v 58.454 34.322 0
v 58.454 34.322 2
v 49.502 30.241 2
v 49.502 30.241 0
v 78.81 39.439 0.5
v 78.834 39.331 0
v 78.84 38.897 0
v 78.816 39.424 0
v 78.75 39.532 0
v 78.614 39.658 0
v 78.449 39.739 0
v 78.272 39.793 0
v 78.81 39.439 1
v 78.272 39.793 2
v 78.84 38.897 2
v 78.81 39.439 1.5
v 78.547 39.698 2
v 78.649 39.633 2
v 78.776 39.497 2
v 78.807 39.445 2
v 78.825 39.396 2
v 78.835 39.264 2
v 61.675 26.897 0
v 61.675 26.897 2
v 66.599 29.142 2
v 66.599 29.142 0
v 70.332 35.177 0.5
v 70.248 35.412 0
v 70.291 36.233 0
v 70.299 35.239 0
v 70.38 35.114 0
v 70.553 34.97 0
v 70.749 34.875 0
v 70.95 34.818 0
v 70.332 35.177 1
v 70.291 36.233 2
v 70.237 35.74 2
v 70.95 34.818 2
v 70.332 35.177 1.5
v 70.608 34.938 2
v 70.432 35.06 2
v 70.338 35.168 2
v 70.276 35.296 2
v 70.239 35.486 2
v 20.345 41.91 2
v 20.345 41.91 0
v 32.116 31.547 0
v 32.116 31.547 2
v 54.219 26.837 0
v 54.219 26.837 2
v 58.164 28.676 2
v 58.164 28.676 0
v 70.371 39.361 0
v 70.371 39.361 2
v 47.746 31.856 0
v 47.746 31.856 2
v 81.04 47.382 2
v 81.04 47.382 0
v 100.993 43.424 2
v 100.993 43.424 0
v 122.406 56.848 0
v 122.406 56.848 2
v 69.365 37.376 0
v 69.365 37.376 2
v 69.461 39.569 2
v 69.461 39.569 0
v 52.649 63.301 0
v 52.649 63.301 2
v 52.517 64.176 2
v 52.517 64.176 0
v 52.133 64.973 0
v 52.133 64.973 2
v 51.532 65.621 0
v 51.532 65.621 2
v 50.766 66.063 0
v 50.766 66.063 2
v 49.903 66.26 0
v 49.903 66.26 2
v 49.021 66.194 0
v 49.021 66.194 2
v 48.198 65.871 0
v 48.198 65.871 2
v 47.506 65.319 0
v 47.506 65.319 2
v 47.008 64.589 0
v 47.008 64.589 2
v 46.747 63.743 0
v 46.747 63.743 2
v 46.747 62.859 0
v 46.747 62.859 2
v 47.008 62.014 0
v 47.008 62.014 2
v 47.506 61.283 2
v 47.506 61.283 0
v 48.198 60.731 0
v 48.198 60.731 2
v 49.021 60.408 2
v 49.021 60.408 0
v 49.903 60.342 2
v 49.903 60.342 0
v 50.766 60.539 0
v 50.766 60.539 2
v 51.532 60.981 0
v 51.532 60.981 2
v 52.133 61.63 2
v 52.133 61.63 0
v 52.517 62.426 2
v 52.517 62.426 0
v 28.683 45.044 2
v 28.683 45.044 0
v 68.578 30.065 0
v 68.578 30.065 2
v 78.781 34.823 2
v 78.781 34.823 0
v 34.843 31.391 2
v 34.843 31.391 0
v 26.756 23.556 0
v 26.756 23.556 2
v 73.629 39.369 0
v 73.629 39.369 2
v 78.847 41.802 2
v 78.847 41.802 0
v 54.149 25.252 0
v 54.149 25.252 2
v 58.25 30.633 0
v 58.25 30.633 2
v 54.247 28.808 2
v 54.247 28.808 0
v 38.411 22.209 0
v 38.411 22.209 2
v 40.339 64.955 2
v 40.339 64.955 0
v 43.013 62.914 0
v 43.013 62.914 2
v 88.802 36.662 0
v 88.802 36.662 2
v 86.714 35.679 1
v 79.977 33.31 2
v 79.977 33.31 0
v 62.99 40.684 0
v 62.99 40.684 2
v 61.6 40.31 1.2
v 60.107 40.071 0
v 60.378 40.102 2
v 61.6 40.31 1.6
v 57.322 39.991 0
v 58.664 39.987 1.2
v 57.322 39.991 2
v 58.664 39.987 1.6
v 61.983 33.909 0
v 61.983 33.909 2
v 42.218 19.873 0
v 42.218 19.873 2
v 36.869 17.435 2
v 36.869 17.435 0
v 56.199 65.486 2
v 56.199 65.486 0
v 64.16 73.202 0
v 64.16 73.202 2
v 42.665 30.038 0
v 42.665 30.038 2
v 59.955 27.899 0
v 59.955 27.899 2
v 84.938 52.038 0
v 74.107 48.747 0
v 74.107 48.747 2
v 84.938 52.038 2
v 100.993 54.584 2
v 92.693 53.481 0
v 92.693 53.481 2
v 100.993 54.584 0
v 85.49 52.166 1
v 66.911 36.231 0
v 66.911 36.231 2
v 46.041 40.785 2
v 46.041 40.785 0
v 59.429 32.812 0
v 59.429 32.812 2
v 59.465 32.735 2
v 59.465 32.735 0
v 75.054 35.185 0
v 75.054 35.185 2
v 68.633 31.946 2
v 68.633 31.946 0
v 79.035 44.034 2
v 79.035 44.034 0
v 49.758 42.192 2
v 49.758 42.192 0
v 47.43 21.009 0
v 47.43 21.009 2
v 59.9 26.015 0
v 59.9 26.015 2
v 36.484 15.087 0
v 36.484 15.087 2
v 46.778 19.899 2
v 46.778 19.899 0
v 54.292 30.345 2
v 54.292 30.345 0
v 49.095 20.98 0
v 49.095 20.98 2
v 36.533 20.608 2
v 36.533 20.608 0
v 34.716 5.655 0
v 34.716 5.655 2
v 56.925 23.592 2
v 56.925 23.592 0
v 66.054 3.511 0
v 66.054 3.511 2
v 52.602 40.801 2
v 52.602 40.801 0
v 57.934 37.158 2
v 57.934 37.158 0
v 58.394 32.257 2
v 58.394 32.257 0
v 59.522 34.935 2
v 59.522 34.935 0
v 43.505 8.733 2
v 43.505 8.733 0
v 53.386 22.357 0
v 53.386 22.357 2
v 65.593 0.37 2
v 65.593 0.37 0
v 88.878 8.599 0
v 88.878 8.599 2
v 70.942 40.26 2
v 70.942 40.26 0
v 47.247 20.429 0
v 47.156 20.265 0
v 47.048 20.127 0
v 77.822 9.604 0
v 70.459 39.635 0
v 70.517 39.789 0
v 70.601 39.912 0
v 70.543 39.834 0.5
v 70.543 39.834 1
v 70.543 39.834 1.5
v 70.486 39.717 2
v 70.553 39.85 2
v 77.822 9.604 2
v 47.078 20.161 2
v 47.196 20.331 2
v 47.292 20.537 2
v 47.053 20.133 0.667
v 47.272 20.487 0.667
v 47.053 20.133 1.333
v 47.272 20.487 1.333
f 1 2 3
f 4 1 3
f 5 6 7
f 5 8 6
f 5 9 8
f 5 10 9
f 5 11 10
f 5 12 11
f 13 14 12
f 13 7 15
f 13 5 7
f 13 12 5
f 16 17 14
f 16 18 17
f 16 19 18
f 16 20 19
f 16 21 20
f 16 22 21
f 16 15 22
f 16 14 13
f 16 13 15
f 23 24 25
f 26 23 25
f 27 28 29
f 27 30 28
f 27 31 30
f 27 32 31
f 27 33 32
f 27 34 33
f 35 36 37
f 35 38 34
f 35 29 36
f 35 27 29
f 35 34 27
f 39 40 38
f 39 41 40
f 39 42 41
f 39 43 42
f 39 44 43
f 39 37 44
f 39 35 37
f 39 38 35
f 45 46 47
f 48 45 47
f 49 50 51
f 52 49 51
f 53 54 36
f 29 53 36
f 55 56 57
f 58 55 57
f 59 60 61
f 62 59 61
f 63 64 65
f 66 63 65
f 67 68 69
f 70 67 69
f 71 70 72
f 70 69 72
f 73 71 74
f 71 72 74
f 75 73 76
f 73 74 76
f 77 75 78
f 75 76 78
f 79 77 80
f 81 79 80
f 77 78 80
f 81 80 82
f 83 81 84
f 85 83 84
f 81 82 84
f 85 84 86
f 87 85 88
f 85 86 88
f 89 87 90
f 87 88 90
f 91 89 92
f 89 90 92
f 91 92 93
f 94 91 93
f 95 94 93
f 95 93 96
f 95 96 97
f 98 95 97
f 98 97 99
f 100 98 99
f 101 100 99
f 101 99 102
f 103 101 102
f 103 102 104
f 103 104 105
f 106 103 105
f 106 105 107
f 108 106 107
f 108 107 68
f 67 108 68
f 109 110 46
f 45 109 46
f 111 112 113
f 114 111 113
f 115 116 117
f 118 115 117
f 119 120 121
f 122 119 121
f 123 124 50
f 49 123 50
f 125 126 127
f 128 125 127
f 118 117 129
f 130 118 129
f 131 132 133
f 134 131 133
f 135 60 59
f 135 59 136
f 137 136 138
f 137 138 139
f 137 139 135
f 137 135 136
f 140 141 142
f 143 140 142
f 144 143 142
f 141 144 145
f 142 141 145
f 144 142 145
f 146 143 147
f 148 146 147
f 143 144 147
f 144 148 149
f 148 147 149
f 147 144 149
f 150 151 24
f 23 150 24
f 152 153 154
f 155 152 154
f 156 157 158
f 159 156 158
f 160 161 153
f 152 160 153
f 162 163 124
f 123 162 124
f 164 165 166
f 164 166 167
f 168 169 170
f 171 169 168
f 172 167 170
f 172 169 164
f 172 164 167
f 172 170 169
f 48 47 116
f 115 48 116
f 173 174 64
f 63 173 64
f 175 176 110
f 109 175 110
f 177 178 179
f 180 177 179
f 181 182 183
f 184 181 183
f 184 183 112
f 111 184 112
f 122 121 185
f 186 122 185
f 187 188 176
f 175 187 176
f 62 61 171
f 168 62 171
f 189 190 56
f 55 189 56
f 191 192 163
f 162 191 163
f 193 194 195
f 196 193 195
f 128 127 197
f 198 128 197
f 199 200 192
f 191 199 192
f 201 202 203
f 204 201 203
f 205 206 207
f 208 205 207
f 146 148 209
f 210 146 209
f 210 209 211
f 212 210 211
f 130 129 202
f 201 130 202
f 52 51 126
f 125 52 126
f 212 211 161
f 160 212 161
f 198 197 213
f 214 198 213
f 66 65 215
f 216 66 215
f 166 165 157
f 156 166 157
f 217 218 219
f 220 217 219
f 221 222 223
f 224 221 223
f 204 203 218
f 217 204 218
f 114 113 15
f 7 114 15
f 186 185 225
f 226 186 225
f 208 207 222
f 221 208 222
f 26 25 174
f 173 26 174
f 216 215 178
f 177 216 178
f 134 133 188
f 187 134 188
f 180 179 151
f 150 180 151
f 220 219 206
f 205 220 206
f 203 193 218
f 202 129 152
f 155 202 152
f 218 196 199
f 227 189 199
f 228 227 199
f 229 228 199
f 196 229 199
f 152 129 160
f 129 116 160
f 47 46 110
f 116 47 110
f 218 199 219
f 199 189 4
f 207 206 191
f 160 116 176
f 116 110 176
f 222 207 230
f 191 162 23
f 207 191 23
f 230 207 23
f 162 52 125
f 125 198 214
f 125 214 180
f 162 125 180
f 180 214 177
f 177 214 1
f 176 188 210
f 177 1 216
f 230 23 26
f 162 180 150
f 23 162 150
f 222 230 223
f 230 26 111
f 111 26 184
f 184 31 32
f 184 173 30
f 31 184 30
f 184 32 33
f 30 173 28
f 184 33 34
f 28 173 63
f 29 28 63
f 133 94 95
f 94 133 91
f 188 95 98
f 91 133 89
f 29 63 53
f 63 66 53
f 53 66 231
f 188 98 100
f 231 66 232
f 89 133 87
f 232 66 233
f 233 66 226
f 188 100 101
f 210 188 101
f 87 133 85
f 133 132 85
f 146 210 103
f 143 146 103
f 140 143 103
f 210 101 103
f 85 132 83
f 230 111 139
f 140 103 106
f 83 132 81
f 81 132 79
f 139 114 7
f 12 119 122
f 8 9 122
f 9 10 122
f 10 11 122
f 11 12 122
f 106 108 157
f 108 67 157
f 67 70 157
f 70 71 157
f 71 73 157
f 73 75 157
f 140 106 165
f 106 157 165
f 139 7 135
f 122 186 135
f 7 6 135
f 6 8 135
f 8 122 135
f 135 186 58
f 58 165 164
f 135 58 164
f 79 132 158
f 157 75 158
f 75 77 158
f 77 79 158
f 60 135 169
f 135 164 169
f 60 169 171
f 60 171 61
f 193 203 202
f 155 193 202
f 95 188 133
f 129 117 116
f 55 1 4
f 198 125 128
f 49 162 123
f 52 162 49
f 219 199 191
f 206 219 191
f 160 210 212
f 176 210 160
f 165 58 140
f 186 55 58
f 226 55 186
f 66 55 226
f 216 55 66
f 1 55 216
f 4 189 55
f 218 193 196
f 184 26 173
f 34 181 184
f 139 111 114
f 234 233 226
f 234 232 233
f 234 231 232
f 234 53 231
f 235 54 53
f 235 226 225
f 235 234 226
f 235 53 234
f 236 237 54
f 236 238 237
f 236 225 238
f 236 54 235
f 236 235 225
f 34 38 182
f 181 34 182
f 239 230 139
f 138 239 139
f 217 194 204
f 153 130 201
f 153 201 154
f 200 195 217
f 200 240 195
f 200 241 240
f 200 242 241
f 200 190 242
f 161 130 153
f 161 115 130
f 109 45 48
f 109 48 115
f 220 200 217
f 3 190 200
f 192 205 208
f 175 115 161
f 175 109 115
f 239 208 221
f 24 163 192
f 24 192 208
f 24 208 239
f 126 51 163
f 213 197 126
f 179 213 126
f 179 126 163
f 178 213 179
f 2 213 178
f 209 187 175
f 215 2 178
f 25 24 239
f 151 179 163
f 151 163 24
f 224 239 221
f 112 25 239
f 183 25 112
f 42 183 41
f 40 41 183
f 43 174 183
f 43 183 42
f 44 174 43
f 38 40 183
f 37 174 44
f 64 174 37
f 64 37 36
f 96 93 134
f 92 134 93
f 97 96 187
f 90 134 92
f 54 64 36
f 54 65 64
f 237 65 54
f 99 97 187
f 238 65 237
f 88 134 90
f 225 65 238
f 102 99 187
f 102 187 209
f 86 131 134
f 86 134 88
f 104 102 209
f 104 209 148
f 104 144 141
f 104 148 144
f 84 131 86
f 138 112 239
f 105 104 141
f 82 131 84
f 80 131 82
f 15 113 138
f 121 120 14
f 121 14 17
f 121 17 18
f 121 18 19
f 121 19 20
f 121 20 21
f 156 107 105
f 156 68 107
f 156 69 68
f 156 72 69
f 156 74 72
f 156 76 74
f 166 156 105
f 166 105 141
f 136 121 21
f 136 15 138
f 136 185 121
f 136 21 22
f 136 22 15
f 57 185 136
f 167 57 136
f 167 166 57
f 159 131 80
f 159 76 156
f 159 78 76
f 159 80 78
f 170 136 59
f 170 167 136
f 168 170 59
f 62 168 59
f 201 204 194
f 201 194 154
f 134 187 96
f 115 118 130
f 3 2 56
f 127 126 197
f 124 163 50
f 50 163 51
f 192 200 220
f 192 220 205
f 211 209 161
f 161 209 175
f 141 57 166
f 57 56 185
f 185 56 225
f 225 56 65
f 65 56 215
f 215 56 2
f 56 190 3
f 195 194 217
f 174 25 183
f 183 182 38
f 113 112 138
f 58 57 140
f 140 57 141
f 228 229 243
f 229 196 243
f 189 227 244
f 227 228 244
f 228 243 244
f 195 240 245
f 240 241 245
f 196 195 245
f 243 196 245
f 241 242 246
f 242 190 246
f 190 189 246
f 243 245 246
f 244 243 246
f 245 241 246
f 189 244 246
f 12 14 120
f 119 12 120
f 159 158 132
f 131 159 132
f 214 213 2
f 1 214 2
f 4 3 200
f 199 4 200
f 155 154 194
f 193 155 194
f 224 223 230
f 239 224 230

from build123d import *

# Parameters (mm, degrees)
F1_DEPTH = 2
F3_DEPTH = 25.4
F4_R     = 2.9673782323
F5_DEPTH = 25.4


with BuildPart() as f1:
    # F0 (on Top) → F1 (new body)
    with BuildSketch(Plane.XY):
        with BuildLine():
            Line((36.5334041417, 20.6077042967), (34.7164385021, 5.6545715779))
            Line((34.7164385021, 5.6545715779), (43.504524976, 8.7329633534))
            Line((43.504524976, 8.7329633534), (53.3858016133, 22.3565343767))
            Line((53.3858016133, 22.3565343767), (56.9245554507, 23.5919579864))
            Line((56.9245554507, 23.5919579864), (66.0541206598, 3.5111056641))
            Line((66.0541206598, 3.5111056641), (65.5934512615, 0.3702012473))
            Line((65.5934512615, 0.3702012473), (88.8780280948, 8.5993725806))
            Line((88.8780280948, 8.5993725806), (77.8220444918, 9.6044624224))
            Line((77.8220444918, 9.6044624224), (79.9770836988, 33.3098837159))
            add(Edge.make_bspline(
                [(100.9928658605, 43.4244535863), (95.8205314108, 40.4245140318), (87.218727926, 35.4354920021), (82.0412871818, 33.9157803728), (79.9770836988, 33.3098837159)],
                knots=[0, 0, 0, 0, 0.6013081395, 1, 1, 1, 1], degree=3))
            Line((100.9928658605, 43.4244535863), (122.4057301879, 56.8480975926))
            Line((122.4057301879, 56.8480975926), (100.9928658605, 54.5836277306))
            add(Edge.make_bspline(
                [(74.1065740585, 48.7466789782), (77.7375523931, 49.9883488185), (85.5402467252, 52.6566022015), (95.6093908771, 53.9122791626), (100.9928658605, 54.5836277306)],
                knots=[0, 0, 0, 0, 0.4653492986, 1, 1, 1, 1], degree=3))
            Line((74.1065740585, 48.7466789782), (56.1992712319, 65.4858723283))
            Line((56.1992712319, 65.4858723283), (64.1599148512, 73.2015818357))
            Line((64.1599148512, 73.2015818357), (40.3392016888, 64.9551600218))
            Line((40.3392016888, 64.9551600218), (43.0131666362, 62.9139691591))
            Line((43.0131666362, 62.9139691591), (49.7575812042, 42.1915054321))
            Line((49.7575812042, 42.1915054321), (46.0408888757, 40.785189718))
            Line((46.0408888757, 40.785189718), (28.6829099059, 45.0443252921))
            Line((28.6829099059, 45.0443252921), (20.3454550356, 41.9102460146))
            Line((20.3454550356, 41.9102460146), (32.1155525744, 31.5474160016))
            Line((32.1155525744, 31.5474160016), (34.8427295685, 31.390786171))
            Line((34.8427295685, 31.390786171), (26.7557948828, 23.5558375716))
            Line((26.7557948828, 23.5558375716), (38.4109728038, 22.2089737654))
            Line((38.4109728038, 22.2089737654), (36.5334041417, 20.6077042967))
        make_face()
    extrude(amount=F1_DEPTH)

    # F2 (on face) → F3 (cut)
    with BuildSketch(Plane.XY.offset(2)):
        with BuildLine():
            Line((42.2181976585, 19.8732110921), (36.8692806095, 17.4346802651))
            Line((36.8692806095, 17.4346802651), (36.4842974601, 15.086657103))
            Line((36.4842974601, 15.086657103), (46.7783554459, 19.8987160716))
            add(Edge.make_bspline(
                [(46.7783554459, 19.8987160716), (46.8745176, 19.9704084061), (47.0739666013, 20.1191047892), (47.2980762453, 20.485200609), (47.3842570525, 20.8264985477), (47.4302483861, 21.0086359383)],
                knots=[0, 0, 0, 0, 0.3027331314, 0.6278958833, 1, 1, 1, 1], degree=3))
            Line((47.4302483861, 21.0086359383), (47.7455708418, 31.8560887995))
            Line((47.7455708418, 31.8560887995), (81.0400521274, 47.3815603972))
            Line((81.0400521274, 47.3815603972), (62.989893266, 40.6838828661))
            add(Edge.make_bspline(
                [(62.989893266, 40.6838828661), (62.8558315332, 40.6463925764), (62.5252333481, 40.5539409762), (61.561398363, 40.2753929938), (60.1603447931, 40.0500849593), (58.6709939197, 39.9709989719), (57.7632965831, 39.984203494), (57.3223569205, 39.9906179643)],
                knots=[0, 0, 0, 0, 0.128570723, 0.3170572751, 0.5463912938, 0.7796467371, 1, 1, 1, 1], degree=3))
            Line((57.3223569205, 39.9906179643), (52.6017494717, 40.801062884))
            Line((52.6017494717, 40.801062884), (57.934057, 37.1581308102))
            Line((57.934057, 37.1581308102), (42.6651981272, 30.0381449865))
            Line((42.6651981272, 30.0381449865), (42.2181976585, 19.8732110921))
        make_face()
        Polygon((49.5022008402, 30.2405287443), (49.0949496514, 20.9795062106), (59.8999263935, 26.0145180069), (59.9547064443, 27.8990143615), (54.1489528303, 25.2522151997), (54.2186230073, 26.8365373498), (58.1639420177, 28.6762698182), (58.2499672688, 30.6325115923), (54.2469362683, 28.8075600354), (54.2916153656, 30.3445720468), (58.3938732965, 32.2574863357), (58.4538725188, 34.3215281581), align=None)
        Polygon((59.5222907582, 34.9345568584), (59.428932466, 32.8115593767), (59.4646008131, 32.7350683593), (61.9832756911, 33.9087458252), (61.6749329049, 26.8969320603), (66.5988146686, 29.1416925155), (66.910579019, 36.231313745), (69.3646524393, 37.3756669746), (69.4611082747, 39.5691035793), align=None)
        with BuildLine():
            Line((68.6329693369, 31.9457548078), (68.5782904095, 30.0647372126))
            Line((68.5782904095, 30.0647372126), (78.7814682825, 34.8225571923))
            Line((78.7814682825, 34.8225571923), (78.8403507658, 38.8965850372))
            add(Edge.make_bspline(
                [(78.2723558252, 39.7925434403), (78.3906581343, 39.7604877829), (78.6166051238, 39.6992643009), (78.8326978206, 39.4449395511), (78.8350317991, 39.281221064), (78.8383302277, 39.0426983364), (78.8403507658, 38.8965850372)],
                knots=[0, 0, 0, 0, 0.2775927016, 0.5301776076, 0.7121980765, 1, 1, 1, 1], degree=3))
            Line((78.2723558252, 39.7925434403), (73.6286103285, 39.3689603356))
            Line((73.6286103285, 39.3689603356), (78.8465645596, 41.8021323534))
            Line((78.8465645596, 41.8021323534), (79.0354909806, 44.0337115572))
            Line((79.0354909806, 44.0337115572), (70.9420511465, 40.2596785817))
            add(Edge.make_bspline(
                [(70.3706405965, 39.3610387878), (70.3940565505, 39.4260226012), (70.4447676448, 39.5667557219), (70.5089015879, 39.8524246499), (70.812566625, 40.1149514275), (70.9043252634, 40.2175116908), (70.9420511465, 40.2596785817)],
                knots=[0, 0, 0, 0, 0.2238252163, 0.4847302664, 0.788150674, 1, 1, 1, 1], degree=3))
            Line((70.3706405965, 39.3610387878), (70.2906058242, 36.2328217133))
            add(Edge.make_bspline(
                [(70.9504246956, 34.8178355773), (70.8567559171, 34.8408667038), (70.6527174927, 34.8910353388), (70.2713296013, 35.1507757935), (70.2107102416, 35.6389400995), (70.2627540341, 36.0257931705), (70.2906058242, 36.2328217133)],
                knots=[0, 0, 0, 0, 0.2072963417, 0.4515530113, 0.7064927503, 1, 1, 1, 1], degree=3))
            Line((70.9504246956, 34.8178355773), (75.0539136601, 35.1847569247))
            Line((75.0539136601, 35.1847569247), (68.6329693369, 31.9457548078))
        make_face()
    extrude(amount=-F3_DEPTH, mode=Mode.SUBTRACT)

    # F4 (on face) → F5 (cut)
    with BuildSketch(Plane.XY.offset(2)):
        with Locations((49.6815554798, 63.3011460304)):
            Circle(F4_R)
    extrude(amount=-F5_DEPTH, mode=Mode.SUBTRACT)


solid = f1.part
